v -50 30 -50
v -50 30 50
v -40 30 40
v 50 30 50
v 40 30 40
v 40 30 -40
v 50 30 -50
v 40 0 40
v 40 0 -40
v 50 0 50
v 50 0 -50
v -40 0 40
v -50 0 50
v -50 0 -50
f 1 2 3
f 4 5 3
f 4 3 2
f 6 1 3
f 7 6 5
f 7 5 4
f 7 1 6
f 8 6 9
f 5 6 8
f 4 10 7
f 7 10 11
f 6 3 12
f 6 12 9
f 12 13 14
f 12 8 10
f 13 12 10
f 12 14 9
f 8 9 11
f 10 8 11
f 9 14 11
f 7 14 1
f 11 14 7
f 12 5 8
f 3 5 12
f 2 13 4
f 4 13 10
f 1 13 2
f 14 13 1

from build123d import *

# Parameters (mm, degrees)
SKETCH1_W           = 100
SKETCH1_H           = 100
BOSS_EXTRUDE1_DEPTH = 30
CUT_EXTRUDE1_DEPTH  = 31


with BuildPart() as part:
    # Sketch1 → Boss-Extrude1 (new body)
    with BuildSketch(Plane(origin=(0, 0, 0), x_dir=(1, 0, 0), z_dir=(0, 1, 0))):
        Rectangle(SKETCH1_W, SKETCH1_H)
    extrude(amount=BOSS_EXTRUDE1_DEPTH)

    # Sketch2 → Cut-Extrude1 (cut, through all)
    with BuildSketch(Plane(origin=(0, 30, 0), x_dir=(1, 0, 0), z_dir=(0, 1, 0))):
        Polygon((40, 40), (40, -40), (-40, -40), align=None)
    extrude(amount=-CUT_EXTRUDE1_DEPTH, mode=Mode.SUBTRACT)


solid = part.part
